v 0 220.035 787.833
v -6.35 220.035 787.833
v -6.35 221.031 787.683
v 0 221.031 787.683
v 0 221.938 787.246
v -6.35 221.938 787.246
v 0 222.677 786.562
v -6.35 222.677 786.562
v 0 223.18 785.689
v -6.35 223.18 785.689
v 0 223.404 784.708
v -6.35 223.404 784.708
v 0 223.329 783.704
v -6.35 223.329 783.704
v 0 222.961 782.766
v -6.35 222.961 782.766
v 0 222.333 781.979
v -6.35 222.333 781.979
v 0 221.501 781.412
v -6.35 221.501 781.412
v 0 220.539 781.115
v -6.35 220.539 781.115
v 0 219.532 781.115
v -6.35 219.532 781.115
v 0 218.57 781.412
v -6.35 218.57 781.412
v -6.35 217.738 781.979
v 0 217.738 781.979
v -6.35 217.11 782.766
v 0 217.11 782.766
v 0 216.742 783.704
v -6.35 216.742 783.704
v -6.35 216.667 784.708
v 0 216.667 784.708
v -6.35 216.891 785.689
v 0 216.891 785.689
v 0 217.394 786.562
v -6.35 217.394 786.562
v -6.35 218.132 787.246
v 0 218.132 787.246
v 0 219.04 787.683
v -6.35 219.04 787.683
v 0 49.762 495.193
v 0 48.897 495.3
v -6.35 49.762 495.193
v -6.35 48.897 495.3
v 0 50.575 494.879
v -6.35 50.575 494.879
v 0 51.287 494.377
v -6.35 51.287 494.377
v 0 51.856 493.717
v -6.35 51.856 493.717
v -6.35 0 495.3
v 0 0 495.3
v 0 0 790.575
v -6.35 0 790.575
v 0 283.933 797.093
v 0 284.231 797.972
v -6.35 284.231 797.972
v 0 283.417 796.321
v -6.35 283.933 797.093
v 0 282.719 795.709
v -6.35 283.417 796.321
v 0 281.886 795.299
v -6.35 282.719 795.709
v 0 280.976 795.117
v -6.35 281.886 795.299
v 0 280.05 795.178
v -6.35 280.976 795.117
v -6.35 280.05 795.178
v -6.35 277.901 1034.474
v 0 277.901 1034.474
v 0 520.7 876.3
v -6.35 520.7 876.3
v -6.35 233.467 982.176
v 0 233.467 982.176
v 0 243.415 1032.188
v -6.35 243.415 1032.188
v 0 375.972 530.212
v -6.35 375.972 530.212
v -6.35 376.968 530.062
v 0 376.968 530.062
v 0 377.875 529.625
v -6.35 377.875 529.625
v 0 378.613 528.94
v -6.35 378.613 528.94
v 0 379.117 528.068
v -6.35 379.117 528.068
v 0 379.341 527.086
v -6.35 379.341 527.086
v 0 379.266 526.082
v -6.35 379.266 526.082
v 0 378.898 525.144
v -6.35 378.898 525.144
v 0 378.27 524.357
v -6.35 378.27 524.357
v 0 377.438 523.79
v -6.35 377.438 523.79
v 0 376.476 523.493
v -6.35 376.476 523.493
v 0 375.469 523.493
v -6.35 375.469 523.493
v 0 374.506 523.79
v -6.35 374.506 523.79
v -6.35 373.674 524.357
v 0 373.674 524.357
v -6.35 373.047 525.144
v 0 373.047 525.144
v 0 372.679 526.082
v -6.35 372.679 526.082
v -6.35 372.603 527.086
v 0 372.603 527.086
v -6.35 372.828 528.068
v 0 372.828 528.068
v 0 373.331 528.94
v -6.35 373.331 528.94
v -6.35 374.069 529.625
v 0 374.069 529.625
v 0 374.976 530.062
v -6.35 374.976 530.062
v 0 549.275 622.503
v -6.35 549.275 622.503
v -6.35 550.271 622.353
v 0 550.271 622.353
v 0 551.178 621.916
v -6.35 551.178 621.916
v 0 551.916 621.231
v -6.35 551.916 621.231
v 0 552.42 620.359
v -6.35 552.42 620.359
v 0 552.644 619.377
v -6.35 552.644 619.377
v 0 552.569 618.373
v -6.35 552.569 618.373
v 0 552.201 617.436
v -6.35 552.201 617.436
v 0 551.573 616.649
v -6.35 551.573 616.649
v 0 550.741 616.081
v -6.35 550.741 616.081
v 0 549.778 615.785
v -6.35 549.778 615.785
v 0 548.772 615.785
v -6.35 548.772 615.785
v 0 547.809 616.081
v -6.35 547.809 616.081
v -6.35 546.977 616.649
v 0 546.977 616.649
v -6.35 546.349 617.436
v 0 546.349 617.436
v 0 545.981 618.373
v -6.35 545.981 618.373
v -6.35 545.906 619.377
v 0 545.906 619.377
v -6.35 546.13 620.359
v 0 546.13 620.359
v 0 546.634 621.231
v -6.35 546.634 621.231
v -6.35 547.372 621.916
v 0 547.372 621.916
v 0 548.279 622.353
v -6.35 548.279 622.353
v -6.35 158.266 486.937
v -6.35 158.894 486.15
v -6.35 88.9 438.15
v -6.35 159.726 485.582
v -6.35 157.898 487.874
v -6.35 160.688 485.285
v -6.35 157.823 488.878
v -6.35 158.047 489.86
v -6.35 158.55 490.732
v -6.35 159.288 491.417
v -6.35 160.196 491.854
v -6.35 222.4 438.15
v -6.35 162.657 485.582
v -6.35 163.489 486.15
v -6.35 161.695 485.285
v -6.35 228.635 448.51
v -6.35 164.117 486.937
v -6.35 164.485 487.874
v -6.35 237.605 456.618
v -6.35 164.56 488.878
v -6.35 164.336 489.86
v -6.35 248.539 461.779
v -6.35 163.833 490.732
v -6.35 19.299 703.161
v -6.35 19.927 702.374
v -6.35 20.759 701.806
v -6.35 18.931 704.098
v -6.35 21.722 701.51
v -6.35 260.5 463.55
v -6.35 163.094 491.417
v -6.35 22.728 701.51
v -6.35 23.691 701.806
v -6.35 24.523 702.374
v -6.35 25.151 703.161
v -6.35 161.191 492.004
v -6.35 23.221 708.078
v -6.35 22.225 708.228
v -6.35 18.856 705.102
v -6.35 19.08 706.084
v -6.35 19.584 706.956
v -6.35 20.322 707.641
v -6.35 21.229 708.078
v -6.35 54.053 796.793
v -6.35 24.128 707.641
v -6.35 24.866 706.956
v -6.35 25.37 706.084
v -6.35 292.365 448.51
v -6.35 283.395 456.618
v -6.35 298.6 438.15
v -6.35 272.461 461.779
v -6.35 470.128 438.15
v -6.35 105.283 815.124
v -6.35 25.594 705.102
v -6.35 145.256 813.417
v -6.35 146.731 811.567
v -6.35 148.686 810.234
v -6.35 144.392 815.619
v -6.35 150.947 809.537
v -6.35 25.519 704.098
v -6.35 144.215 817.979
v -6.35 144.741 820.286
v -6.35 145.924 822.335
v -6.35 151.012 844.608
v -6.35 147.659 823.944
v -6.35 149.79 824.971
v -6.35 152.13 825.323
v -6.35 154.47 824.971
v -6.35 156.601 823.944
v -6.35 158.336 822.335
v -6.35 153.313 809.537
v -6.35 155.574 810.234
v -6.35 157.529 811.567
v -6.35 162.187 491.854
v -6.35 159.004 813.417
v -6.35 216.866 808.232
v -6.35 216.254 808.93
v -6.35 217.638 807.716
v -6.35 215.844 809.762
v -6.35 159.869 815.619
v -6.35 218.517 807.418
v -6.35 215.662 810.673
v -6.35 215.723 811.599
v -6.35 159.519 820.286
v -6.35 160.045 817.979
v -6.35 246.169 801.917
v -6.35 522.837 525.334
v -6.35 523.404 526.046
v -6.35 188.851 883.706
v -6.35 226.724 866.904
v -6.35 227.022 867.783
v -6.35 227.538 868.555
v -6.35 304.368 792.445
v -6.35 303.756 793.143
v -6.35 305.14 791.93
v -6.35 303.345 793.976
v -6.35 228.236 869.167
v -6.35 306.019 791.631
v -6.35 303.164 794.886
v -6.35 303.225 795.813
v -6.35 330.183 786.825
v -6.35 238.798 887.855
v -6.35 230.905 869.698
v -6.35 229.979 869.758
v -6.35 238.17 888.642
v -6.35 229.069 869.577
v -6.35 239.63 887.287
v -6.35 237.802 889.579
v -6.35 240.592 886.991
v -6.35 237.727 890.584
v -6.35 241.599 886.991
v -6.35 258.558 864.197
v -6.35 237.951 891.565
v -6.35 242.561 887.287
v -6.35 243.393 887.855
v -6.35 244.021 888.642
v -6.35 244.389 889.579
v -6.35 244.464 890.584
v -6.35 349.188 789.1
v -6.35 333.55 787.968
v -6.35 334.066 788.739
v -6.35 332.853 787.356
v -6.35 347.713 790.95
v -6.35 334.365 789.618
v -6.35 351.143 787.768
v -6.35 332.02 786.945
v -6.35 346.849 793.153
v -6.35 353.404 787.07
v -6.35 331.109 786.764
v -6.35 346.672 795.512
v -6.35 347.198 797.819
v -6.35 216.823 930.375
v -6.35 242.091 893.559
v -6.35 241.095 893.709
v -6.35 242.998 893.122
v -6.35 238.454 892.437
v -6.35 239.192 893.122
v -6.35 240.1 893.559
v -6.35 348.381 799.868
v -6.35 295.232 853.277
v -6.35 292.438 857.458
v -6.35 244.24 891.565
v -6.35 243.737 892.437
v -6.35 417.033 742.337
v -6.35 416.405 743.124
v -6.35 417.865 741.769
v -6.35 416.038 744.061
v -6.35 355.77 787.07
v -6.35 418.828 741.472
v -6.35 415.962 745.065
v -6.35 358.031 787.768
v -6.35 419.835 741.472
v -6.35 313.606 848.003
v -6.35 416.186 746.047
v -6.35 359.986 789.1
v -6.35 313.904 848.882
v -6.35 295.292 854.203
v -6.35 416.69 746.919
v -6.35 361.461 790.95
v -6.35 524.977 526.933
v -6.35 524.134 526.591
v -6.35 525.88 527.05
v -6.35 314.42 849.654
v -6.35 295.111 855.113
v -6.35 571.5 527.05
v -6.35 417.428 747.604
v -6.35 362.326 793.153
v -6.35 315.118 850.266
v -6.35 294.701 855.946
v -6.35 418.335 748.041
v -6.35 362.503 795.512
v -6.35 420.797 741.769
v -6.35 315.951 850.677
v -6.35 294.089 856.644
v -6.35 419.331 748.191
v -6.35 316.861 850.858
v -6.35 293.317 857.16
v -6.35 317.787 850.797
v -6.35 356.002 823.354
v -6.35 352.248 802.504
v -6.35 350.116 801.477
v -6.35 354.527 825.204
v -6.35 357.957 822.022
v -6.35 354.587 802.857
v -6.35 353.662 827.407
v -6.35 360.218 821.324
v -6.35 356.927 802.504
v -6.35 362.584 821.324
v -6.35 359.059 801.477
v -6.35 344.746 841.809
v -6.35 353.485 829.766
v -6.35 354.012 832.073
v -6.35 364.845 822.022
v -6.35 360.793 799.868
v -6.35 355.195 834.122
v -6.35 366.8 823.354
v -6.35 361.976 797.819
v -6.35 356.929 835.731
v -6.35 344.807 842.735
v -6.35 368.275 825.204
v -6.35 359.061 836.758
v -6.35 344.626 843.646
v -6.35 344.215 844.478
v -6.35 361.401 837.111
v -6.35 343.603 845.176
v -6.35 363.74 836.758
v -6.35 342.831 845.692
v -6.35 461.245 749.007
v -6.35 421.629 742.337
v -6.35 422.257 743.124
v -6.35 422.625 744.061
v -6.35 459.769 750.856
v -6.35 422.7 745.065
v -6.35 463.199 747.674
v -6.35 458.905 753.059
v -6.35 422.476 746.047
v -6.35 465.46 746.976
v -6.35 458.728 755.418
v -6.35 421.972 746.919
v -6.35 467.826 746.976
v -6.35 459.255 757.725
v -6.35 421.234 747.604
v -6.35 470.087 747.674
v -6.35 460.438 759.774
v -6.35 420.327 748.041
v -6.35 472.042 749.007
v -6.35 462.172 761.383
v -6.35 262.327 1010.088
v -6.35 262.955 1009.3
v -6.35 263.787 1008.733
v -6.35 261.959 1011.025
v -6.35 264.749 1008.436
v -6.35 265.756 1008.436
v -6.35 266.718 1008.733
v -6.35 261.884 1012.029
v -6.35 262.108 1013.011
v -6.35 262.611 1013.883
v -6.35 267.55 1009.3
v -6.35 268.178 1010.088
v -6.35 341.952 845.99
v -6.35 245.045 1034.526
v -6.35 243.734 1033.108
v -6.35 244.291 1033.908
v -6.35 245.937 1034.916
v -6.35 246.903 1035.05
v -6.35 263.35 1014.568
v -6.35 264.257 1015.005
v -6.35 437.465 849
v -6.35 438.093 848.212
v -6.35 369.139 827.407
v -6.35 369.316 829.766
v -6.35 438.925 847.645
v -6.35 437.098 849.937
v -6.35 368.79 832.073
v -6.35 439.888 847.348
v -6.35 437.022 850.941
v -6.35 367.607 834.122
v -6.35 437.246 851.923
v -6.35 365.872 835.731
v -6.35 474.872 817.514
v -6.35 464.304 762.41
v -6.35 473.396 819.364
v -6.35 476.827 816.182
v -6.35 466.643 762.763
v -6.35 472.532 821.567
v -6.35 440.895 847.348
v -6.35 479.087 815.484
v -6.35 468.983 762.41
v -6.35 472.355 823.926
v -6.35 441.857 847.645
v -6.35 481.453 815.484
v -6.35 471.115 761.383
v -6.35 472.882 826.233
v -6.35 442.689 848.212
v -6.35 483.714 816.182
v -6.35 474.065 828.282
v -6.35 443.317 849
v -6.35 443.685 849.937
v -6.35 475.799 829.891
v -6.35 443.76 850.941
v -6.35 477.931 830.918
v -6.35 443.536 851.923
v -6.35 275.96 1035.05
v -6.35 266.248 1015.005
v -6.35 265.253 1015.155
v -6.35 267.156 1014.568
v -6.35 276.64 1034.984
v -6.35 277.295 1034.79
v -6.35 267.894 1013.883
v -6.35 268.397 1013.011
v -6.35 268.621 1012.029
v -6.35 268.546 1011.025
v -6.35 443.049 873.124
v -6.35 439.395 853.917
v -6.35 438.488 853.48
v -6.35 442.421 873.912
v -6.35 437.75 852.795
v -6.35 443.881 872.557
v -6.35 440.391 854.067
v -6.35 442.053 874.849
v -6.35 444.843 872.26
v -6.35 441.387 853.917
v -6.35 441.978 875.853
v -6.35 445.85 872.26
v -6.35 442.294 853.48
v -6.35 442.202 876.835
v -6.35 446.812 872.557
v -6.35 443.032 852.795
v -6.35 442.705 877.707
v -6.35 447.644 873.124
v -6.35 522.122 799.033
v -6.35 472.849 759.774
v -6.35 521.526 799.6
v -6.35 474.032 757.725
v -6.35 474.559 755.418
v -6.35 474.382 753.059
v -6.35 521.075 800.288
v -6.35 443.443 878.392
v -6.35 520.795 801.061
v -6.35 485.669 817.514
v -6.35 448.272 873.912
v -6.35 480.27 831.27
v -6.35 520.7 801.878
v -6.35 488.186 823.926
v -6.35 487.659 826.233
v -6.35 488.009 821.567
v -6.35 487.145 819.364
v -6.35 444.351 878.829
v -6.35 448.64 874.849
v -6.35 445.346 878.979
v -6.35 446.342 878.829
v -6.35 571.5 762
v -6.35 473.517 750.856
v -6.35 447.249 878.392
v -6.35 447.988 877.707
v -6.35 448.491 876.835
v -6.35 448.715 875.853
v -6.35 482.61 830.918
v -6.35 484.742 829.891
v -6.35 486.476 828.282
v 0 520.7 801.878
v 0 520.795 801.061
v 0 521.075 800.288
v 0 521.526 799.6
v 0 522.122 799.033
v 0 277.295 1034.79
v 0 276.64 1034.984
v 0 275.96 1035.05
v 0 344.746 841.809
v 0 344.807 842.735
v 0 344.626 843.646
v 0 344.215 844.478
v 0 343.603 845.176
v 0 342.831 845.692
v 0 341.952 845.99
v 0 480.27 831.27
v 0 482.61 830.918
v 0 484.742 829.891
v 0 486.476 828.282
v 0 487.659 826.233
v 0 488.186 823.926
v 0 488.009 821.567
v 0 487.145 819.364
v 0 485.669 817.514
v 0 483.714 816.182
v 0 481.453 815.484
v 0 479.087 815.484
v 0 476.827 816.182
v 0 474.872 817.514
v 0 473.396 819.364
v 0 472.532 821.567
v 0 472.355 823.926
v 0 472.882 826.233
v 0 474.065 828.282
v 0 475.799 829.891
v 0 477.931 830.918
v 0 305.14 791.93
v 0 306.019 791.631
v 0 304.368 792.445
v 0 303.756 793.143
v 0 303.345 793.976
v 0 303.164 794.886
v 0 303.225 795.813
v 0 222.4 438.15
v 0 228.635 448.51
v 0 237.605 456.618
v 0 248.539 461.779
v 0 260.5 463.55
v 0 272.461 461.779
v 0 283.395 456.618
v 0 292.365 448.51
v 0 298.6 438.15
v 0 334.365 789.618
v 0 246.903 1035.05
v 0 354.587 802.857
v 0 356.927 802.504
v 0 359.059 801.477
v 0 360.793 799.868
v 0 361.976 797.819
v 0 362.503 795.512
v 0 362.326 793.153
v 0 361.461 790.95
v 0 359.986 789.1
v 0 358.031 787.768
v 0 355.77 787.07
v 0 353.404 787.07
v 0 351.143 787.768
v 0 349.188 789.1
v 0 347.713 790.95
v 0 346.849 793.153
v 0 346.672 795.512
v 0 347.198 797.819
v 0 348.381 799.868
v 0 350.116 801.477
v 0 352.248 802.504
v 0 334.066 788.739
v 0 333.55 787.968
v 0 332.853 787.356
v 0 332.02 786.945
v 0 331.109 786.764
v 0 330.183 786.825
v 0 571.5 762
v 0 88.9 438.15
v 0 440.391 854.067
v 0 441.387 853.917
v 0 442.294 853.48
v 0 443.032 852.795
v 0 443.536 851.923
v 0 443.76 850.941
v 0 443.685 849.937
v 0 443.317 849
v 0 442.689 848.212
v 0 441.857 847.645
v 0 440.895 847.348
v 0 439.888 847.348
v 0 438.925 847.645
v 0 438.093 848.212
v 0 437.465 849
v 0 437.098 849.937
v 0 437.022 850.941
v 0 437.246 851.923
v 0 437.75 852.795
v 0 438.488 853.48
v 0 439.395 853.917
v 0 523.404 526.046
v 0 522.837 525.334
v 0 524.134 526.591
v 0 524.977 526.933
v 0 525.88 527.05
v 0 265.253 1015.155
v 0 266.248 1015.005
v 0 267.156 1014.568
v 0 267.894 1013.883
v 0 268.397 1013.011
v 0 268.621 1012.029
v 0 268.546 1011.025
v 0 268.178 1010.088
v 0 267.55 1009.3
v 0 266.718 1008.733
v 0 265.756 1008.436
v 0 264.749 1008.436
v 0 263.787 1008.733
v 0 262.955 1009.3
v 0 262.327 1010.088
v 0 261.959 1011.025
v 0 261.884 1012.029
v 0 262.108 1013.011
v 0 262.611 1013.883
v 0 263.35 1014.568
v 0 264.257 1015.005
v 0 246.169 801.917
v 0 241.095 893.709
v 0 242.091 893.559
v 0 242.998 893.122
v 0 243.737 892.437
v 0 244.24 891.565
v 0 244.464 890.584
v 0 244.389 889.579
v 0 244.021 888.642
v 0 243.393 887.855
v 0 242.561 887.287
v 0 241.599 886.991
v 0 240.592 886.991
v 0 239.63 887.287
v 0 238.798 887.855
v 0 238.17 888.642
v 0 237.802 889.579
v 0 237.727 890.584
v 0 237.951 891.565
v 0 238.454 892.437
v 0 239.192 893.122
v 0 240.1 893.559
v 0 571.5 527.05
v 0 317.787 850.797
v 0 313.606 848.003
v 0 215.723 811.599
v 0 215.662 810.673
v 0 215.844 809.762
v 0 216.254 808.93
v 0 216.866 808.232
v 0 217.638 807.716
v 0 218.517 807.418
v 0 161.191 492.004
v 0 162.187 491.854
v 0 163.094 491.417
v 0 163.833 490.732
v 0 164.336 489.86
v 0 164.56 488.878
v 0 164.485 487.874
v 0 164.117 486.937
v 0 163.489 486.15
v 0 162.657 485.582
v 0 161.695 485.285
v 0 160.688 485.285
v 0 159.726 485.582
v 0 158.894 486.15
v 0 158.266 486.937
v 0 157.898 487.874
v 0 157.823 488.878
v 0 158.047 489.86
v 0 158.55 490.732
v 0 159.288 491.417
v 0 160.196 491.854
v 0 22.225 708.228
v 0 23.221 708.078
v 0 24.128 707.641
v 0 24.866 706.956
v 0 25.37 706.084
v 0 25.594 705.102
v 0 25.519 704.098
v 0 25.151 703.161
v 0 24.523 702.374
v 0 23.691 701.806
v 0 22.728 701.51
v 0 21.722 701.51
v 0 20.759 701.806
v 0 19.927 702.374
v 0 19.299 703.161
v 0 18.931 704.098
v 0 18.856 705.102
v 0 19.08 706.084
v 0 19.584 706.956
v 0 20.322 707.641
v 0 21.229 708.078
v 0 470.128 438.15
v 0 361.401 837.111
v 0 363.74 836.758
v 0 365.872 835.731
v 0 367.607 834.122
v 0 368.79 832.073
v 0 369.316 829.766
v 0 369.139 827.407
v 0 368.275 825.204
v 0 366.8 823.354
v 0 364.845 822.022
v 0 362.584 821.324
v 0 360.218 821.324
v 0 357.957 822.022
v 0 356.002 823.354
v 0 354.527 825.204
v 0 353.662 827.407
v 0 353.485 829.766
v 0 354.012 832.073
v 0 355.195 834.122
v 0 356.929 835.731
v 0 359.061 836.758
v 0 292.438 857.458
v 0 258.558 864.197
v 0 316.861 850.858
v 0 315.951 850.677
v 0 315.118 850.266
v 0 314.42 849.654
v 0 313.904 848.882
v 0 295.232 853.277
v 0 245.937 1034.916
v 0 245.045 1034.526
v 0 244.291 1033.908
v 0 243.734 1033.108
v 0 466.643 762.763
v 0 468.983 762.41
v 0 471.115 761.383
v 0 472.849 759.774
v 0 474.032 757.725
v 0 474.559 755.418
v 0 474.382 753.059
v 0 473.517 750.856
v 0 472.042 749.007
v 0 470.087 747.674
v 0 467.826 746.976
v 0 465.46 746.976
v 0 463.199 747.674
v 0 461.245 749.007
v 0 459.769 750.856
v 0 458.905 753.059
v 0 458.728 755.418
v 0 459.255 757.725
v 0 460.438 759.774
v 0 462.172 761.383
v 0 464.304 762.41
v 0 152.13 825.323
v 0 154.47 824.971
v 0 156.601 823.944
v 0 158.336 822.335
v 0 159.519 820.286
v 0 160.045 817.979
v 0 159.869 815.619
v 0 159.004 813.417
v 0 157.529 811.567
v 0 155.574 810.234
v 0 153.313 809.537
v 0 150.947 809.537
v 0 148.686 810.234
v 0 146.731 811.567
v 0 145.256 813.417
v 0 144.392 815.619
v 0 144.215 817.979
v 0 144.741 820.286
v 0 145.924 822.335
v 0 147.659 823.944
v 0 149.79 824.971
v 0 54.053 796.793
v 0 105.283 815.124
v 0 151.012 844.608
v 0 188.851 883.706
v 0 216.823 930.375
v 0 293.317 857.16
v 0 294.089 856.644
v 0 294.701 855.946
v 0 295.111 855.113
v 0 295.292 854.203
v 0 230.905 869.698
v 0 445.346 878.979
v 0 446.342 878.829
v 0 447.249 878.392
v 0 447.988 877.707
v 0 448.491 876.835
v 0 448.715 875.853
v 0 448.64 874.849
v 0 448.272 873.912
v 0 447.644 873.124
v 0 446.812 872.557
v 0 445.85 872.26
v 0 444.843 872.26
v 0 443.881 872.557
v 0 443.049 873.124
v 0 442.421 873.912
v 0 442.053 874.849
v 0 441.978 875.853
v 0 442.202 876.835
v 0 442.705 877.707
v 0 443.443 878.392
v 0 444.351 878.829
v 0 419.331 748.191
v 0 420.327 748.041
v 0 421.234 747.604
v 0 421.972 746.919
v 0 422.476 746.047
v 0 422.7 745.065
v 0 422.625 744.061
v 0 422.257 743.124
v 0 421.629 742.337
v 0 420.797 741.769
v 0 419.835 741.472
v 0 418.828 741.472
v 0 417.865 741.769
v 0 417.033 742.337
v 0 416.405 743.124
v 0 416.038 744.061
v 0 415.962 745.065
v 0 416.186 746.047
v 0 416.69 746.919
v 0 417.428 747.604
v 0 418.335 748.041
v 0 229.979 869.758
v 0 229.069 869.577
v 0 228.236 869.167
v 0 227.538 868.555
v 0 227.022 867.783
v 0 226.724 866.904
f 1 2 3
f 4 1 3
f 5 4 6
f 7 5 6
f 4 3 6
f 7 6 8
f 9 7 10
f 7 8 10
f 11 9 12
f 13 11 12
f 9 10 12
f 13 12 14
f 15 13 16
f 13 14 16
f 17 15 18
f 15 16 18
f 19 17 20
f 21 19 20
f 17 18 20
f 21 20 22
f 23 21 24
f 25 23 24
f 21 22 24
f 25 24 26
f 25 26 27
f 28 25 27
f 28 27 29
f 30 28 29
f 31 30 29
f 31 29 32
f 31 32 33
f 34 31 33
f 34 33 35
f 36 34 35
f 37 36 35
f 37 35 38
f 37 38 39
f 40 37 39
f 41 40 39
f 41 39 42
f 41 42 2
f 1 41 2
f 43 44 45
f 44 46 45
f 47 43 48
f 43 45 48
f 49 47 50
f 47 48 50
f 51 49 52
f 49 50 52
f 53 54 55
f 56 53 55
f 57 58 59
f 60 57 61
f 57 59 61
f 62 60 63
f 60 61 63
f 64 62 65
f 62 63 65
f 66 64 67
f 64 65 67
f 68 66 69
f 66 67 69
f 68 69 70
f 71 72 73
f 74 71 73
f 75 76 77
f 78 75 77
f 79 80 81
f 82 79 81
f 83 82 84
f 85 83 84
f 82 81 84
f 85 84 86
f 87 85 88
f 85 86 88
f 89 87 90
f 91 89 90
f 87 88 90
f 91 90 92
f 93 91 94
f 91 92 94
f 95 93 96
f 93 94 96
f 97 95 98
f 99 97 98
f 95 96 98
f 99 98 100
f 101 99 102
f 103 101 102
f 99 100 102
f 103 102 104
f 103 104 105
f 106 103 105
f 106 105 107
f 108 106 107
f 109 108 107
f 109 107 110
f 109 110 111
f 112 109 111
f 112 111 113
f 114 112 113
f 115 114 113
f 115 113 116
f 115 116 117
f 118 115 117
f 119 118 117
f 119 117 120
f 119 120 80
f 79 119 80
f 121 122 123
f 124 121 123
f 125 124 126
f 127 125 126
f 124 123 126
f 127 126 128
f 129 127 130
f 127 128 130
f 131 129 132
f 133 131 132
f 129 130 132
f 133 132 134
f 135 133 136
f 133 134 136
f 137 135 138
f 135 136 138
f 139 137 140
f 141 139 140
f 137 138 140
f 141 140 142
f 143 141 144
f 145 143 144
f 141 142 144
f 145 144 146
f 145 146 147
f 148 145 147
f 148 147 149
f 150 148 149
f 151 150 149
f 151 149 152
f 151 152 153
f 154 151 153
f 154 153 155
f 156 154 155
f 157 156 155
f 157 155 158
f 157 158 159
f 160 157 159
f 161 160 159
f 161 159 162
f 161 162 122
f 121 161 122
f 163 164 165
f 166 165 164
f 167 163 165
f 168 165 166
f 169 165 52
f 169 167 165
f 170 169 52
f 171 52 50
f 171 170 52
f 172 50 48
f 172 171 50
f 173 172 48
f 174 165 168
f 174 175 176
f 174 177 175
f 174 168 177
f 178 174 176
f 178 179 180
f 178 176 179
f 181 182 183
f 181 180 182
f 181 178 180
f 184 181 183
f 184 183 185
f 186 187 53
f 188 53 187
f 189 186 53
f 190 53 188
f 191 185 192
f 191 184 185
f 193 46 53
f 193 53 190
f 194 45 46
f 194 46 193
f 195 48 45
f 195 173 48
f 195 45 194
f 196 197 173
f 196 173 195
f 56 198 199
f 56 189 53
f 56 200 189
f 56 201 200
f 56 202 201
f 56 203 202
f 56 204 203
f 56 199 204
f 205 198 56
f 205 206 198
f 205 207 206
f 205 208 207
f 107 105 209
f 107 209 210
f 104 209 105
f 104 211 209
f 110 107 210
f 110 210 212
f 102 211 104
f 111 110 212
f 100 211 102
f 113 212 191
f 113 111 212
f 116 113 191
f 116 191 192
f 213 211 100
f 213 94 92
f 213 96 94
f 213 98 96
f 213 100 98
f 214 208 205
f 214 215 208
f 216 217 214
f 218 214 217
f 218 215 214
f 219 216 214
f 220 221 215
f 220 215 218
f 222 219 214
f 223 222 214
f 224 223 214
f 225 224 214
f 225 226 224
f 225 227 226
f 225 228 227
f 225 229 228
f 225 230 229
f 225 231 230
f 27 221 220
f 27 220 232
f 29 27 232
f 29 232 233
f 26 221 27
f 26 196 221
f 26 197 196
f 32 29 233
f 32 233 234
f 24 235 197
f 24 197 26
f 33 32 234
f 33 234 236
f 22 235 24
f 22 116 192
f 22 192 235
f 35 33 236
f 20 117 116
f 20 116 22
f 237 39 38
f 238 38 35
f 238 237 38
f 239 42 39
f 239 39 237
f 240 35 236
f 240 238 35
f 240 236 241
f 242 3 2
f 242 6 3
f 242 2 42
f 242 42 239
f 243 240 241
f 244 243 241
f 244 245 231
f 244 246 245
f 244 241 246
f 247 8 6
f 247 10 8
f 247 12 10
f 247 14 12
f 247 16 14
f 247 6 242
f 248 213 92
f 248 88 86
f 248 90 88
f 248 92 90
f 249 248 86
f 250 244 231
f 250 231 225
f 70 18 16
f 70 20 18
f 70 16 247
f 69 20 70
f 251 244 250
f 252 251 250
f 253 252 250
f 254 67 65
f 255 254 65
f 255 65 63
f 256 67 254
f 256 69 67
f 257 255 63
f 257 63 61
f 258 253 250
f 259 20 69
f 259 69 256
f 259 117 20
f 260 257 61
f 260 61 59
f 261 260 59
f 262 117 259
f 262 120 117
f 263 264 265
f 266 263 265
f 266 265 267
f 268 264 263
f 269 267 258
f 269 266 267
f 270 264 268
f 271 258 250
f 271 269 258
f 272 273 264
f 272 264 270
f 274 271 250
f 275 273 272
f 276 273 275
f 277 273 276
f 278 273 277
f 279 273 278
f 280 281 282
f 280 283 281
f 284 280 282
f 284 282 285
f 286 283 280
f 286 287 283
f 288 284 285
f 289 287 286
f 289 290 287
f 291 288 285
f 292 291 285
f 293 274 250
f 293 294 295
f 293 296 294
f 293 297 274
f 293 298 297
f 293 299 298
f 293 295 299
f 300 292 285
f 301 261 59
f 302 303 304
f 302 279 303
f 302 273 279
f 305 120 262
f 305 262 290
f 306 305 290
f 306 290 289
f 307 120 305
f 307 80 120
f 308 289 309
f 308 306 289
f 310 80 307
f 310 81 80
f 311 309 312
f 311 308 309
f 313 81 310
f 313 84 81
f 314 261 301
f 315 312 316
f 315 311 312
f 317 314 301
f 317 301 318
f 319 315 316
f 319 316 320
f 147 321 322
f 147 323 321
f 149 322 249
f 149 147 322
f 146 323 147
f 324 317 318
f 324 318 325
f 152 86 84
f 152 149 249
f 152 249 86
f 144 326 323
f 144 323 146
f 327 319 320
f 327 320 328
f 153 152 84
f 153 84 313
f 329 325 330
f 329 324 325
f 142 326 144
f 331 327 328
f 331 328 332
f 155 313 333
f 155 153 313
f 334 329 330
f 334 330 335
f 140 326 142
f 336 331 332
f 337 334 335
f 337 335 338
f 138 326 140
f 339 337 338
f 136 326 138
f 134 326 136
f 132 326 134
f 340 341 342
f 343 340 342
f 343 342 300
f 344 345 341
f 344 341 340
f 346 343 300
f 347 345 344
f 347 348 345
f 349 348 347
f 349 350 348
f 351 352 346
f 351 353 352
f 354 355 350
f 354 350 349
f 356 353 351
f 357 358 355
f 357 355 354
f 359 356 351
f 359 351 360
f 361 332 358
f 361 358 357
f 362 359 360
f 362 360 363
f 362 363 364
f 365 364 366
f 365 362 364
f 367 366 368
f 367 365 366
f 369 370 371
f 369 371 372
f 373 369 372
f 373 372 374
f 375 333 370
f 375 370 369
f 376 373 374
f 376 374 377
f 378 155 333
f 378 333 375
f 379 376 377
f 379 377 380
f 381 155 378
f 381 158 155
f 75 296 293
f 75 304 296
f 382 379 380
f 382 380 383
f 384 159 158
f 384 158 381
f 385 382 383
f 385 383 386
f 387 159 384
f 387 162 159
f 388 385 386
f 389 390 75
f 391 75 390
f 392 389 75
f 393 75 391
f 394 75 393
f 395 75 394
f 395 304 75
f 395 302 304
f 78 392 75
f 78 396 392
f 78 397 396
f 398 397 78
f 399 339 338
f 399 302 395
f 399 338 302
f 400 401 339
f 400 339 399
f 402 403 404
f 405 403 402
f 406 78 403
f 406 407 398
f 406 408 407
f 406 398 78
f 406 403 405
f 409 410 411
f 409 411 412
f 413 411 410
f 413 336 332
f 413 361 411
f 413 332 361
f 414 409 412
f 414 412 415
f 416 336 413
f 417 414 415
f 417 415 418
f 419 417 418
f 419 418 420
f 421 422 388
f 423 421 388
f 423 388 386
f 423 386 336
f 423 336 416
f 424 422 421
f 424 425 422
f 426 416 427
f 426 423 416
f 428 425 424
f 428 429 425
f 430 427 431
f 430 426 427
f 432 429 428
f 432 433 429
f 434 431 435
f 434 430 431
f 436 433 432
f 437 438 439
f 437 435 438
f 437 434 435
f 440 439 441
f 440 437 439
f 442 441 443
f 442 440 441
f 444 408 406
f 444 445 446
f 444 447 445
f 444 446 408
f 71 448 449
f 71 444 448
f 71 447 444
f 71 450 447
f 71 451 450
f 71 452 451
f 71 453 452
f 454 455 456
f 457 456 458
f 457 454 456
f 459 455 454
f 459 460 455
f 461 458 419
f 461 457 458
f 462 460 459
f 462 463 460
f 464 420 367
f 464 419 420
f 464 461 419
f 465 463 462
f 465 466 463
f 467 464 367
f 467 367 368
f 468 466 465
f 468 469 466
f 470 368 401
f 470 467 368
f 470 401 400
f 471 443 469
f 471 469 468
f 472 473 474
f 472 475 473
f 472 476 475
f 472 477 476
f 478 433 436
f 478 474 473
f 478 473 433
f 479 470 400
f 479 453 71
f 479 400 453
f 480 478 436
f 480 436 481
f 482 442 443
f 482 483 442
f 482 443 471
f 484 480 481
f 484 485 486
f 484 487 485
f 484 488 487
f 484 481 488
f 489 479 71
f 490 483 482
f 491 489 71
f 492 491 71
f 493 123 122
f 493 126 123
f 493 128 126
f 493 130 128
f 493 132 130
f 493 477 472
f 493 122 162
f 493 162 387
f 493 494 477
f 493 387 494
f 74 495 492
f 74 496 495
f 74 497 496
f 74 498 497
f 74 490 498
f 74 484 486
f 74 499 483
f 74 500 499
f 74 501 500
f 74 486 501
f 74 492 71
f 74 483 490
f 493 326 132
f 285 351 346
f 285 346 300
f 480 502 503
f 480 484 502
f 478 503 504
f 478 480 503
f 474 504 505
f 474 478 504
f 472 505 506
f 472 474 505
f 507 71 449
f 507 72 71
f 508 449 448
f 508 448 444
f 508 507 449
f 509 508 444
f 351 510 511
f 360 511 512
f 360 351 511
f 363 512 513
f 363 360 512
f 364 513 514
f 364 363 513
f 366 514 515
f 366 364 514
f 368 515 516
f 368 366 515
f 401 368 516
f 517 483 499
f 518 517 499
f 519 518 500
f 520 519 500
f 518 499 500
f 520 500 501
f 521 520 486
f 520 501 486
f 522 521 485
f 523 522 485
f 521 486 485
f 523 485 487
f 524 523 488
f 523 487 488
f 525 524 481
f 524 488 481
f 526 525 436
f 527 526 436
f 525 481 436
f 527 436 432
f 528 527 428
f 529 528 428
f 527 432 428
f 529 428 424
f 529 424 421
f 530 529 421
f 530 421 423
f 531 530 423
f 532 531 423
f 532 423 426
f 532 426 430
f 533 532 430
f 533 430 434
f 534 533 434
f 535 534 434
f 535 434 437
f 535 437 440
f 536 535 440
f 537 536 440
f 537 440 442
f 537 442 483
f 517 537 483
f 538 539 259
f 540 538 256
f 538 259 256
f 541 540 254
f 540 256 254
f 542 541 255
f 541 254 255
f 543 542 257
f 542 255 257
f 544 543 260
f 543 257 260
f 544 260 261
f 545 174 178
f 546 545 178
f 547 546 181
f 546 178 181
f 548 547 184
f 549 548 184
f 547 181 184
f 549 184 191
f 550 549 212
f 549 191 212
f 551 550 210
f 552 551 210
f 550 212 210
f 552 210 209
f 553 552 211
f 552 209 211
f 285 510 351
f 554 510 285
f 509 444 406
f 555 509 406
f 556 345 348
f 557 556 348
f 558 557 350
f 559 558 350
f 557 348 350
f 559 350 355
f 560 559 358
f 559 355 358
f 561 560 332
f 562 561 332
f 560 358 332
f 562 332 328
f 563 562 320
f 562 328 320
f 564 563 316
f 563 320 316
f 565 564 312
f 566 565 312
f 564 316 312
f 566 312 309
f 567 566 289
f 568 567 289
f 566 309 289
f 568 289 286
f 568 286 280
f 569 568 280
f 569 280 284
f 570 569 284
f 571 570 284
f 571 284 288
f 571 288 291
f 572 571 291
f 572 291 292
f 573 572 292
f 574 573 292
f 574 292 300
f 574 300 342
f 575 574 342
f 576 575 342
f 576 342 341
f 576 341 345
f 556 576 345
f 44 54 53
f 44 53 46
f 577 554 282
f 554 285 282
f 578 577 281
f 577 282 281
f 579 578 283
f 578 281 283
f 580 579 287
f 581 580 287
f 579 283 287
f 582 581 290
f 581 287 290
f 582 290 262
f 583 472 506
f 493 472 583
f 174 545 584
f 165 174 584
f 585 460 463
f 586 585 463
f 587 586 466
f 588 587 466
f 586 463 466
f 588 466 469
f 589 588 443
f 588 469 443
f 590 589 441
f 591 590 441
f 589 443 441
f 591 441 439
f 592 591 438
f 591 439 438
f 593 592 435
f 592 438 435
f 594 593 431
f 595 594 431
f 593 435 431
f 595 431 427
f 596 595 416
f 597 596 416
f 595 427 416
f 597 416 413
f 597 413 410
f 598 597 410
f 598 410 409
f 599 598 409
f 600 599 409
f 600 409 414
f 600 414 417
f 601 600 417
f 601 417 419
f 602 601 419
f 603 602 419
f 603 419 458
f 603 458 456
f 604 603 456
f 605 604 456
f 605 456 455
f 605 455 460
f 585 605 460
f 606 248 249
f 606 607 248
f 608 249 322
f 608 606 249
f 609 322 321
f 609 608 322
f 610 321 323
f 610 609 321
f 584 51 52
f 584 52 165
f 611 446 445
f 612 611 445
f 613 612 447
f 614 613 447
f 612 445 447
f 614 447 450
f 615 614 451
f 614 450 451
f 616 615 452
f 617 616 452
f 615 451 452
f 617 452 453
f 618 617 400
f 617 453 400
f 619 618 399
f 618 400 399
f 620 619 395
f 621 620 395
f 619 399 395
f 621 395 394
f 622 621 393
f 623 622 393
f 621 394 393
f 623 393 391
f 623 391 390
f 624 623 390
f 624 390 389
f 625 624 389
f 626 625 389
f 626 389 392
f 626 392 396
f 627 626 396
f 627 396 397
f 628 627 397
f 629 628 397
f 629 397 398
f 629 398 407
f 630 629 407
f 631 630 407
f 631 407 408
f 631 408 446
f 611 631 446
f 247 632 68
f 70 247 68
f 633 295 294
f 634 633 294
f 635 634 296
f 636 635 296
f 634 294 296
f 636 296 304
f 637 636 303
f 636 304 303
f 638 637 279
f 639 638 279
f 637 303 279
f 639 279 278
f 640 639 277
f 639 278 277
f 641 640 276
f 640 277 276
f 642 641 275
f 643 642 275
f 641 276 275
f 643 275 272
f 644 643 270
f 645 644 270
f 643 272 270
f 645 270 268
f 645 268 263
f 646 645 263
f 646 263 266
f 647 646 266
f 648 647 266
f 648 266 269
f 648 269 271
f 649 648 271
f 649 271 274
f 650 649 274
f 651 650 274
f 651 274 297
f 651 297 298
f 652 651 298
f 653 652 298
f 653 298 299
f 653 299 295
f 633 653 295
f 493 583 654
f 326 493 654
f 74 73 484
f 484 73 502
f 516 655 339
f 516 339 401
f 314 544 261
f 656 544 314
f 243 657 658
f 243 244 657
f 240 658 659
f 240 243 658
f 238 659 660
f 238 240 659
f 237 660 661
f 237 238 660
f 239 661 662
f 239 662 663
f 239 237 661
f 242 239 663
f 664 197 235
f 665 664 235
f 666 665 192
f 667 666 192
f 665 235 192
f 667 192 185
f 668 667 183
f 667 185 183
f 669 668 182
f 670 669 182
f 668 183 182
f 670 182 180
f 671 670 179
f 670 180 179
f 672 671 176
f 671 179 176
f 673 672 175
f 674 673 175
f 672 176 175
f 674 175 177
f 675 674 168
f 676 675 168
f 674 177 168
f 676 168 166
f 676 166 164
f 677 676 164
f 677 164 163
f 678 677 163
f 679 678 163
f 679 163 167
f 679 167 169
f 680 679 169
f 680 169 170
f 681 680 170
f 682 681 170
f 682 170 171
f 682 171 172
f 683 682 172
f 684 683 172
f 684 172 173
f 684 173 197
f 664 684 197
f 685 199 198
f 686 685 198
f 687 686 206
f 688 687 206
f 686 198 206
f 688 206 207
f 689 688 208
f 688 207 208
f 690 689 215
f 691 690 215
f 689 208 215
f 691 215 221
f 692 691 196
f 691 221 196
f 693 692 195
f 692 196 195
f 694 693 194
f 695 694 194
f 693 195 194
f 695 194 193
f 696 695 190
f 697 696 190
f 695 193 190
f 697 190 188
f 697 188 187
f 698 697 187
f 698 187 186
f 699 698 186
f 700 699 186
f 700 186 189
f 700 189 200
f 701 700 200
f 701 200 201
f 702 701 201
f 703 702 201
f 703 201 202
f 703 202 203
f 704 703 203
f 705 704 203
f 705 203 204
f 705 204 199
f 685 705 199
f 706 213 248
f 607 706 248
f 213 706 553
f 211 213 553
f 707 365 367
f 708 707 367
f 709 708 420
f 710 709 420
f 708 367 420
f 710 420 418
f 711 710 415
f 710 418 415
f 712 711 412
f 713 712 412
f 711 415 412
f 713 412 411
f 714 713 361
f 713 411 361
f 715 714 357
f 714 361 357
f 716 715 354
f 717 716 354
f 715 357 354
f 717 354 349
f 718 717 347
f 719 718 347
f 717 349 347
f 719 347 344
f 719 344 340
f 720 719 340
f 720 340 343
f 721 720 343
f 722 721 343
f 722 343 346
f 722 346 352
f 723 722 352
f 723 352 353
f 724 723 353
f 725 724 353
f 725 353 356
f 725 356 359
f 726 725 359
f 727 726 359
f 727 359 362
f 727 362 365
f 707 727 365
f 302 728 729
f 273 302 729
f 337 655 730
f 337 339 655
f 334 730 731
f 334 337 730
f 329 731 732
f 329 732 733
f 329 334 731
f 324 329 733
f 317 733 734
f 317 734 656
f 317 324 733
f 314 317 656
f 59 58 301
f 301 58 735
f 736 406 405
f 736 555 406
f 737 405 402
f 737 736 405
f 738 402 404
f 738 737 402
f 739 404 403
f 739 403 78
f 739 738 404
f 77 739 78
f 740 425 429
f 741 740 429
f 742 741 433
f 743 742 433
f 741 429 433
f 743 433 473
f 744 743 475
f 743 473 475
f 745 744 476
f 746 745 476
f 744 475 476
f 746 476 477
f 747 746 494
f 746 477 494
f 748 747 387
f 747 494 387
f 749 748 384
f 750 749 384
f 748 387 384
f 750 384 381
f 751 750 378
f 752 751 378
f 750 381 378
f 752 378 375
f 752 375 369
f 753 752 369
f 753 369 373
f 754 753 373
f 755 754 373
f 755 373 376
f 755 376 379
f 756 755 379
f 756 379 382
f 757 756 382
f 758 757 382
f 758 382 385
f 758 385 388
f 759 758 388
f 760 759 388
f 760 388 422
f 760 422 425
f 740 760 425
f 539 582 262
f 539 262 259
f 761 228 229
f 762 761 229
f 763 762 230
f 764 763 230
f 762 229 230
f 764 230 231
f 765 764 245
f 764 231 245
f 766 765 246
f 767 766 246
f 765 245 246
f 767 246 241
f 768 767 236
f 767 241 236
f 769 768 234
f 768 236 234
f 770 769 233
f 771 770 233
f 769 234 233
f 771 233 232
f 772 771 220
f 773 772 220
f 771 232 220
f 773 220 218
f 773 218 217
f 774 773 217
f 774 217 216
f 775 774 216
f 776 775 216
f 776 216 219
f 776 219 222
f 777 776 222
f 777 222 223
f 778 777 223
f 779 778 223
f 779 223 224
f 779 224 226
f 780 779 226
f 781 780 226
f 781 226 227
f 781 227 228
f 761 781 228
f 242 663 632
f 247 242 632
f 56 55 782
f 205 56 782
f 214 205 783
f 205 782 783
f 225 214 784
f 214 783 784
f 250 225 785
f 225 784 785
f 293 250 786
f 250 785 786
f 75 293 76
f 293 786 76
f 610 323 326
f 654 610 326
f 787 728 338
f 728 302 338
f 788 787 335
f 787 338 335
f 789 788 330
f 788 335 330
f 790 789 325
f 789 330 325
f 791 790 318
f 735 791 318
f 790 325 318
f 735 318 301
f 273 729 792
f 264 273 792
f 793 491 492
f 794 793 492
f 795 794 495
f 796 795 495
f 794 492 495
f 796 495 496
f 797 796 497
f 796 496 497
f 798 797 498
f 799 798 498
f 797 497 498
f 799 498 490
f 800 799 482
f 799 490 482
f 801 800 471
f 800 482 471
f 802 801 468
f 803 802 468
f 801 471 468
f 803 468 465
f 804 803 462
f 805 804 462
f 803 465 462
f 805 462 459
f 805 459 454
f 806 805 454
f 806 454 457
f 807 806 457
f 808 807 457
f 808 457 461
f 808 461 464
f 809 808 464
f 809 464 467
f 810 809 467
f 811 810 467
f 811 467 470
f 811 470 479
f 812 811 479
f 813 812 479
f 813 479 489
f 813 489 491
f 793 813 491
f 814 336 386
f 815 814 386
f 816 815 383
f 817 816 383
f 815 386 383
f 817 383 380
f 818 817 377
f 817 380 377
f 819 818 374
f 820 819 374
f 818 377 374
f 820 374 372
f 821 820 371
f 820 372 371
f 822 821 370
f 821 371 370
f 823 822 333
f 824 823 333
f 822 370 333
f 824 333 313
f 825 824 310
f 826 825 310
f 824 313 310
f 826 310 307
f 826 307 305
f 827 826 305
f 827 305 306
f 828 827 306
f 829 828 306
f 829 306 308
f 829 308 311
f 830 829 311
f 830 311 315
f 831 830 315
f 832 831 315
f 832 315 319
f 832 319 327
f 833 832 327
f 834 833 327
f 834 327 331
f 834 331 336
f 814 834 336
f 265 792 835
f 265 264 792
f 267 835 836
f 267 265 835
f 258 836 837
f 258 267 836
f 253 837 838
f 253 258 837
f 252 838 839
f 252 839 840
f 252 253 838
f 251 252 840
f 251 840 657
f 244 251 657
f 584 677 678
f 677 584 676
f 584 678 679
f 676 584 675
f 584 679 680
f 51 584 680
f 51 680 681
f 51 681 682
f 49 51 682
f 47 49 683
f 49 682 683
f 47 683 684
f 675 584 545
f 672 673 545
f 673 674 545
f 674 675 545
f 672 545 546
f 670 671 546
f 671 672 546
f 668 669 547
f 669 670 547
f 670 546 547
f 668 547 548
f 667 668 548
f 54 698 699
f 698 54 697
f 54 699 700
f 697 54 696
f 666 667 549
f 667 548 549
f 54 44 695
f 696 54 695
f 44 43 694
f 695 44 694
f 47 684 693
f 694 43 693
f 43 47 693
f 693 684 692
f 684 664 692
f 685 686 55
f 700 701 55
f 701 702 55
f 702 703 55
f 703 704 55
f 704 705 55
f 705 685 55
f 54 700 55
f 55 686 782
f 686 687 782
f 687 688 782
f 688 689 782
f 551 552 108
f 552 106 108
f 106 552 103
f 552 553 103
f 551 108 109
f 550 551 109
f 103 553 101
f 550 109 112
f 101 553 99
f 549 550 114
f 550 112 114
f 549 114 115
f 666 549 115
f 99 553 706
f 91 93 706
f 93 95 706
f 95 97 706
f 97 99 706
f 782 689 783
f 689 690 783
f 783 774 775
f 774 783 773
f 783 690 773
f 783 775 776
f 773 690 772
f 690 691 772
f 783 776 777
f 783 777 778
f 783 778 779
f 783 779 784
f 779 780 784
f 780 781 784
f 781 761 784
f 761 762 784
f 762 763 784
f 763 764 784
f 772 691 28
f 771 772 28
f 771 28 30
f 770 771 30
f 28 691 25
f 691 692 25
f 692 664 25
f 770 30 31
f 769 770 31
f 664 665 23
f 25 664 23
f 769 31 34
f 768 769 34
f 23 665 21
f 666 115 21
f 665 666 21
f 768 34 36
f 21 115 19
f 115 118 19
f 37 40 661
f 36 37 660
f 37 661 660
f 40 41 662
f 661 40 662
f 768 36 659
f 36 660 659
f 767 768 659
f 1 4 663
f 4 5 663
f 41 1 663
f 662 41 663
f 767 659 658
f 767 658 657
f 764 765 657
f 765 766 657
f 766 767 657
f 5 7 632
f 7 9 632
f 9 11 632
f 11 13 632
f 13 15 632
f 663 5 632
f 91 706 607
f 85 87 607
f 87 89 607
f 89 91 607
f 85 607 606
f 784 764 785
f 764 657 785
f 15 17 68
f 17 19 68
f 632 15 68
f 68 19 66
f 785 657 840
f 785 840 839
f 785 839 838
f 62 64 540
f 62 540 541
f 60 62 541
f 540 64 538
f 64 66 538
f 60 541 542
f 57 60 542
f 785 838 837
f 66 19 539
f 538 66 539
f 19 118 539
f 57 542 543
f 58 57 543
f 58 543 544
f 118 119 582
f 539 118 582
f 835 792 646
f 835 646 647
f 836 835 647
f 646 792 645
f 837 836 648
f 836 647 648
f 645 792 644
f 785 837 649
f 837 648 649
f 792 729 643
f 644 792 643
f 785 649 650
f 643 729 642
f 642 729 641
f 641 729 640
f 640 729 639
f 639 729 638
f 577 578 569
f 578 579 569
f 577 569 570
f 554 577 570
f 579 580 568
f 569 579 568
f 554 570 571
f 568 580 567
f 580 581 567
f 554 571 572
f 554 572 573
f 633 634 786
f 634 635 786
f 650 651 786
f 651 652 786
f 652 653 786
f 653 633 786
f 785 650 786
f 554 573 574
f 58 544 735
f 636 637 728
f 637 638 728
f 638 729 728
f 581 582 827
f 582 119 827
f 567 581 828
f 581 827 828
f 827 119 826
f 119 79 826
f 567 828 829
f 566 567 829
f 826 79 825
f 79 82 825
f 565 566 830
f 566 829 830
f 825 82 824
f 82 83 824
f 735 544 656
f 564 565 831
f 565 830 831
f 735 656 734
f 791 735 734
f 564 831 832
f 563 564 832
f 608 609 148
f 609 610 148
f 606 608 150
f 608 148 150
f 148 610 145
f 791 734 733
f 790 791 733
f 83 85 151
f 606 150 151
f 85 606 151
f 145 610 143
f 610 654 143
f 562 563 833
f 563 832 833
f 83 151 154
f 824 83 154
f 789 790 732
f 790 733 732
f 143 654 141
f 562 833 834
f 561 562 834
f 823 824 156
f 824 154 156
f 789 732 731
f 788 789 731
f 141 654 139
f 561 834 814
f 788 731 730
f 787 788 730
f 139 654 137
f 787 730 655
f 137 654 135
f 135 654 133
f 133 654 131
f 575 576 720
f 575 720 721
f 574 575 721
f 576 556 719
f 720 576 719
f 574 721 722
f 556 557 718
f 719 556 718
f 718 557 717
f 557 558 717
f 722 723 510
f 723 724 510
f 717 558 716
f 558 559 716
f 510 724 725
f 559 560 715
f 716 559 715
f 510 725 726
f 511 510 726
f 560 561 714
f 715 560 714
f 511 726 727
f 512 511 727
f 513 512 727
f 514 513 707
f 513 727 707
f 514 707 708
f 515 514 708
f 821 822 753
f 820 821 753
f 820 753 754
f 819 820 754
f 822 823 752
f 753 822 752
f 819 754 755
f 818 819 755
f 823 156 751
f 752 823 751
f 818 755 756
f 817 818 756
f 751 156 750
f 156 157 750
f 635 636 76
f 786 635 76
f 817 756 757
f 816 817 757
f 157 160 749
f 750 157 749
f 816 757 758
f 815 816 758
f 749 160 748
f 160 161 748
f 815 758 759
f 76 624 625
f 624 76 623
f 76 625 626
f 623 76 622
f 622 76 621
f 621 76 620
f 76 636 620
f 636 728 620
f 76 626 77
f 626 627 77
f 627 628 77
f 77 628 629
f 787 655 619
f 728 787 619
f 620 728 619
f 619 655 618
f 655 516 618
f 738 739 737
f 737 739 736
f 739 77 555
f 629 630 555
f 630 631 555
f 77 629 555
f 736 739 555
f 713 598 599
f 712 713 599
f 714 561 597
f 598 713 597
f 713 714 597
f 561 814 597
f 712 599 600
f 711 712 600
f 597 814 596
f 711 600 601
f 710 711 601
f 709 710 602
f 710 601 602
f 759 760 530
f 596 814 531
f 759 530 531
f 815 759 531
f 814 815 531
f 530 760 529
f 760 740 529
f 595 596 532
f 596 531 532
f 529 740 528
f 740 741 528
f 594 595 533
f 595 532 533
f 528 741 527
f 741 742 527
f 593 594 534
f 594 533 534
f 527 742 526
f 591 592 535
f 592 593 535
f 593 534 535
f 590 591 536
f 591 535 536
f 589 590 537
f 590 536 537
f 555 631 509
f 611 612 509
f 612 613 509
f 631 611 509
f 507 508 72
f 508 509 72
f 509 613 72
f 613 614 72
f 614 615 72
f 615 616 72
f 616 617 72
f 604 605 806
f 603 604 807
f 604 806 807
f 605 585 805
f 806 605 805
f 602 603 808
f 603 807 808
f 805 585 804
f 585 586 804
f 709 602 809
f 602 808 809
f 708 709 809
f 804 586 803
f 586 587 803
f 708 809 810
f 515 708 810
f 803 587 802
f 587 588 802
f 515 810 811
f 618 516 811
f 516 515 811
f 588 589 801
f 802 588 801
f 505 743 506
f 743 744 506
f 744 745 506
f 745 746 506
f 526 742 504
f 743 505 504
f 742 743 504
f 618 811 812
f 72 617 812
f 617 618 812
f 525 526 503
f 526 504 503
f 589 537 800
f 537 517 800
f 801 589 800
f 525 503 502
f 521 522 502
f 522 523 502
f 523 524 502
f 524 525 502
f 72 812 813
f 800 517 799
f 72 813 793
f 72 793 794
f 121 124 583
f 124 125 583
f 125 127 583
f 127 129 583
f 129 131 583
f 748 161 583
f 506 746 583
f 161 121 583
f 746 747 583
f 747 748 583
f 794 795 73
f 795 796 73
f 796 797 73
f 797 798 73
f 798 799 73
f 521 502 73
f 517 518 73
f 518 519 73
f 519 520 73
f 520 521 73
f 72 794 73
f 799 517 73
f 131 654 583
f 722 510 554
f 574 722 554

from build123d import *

# Parameters (mm, degrees)
BASE_FLANGE1_DEPTH               = 6.35
F_1_4_CLEARANCE_HOLE1_D          = 6.7564
CUT_EXTRUDE1_DEPTH               = 1200.074385724
F_27_32_0_84375_DIAMETER_HOLE1_D = 21.43125
CUT_EXTRUDE2_DEPTH               = 1200.074385724
CUT_EXTRUDE3_DEPTH               = 1200.074385724
CUT_EXTRUDE5_DEPTH               = 1200.074385724
CUT_EXTRUDE6_DEPTH               = 1183.362497291
CUT_EXTRUDE7_DEPTH               = 1183.362497291
CUT_EXTRUDE8_DEPTH               = 1183.362497291
F_5_8_0_625_DIAMETER_HOLE1_D     = 15.875
FILLET2_R                        = 3.556


# Sheet-metal steps are written as plain solids
with BuildPart() as part:
    # Sketch1 → Base-Flange1 (new body)
    with BuildSketch(Plane(origin=(0, 0, 0), x_dir=(0, 0, -1), z_dir=(1, 0, 0))):
        with BuildLine():
            Line((-1054.1, 247.773526455), (-876.3, 520.7))
            Line((-876.3, 520.7), (-800.1, 520.7))
            Line((-800.1, 520.7), (-800.1, 571.5))
            Line((-800.1, 571.5), (-438.15, 571.5))
            Line((-438.15, 571.5), (-438.15, 125.253453767))
            Line((-438.15, 125.253453767), (-438.15, 0))
            Line((-438.15, 0), (-790.575, 0))
            ThreePointArc((-790.575, 0), (-844.607803402, 151.01156908), (-982.176450511, 233.467042956))
            Line((-982.176450511, 233.467042956), (-1054.1, 247.773526455))
        make_face()
    extrude(amount=-BASE_FLANGE1_DEPTH)

    # 1/4 Clearance Hole1 (through all)
    with Locations(Plane(origin=(0, 0, 0), x_dir=(0, 0, -1), z_dir=(1, 0, 0))):
        with Locations((-704.85, 22.225), (-1011.776786637, 265.252531308), (-488.62591807, 161.191353545), (-875.60064198, 445.346335342), (-526.833396269, 375.972216833), (-850.688695858, 440.391041163), (-744.812924838, 419.331040901), (-890.331049291, 241.095472185), (-784.455278272, 220.035471923), (-619.125, 549.275)):
            Hole(F_1_4_CLEARANCE_HOLE1_D / 2)

    # Sketch11 → Cut-Extrude1 (cut, through all)
    with BuildSketch(Plane(origin=(0, 0, 0), x_dir=(0, 0, -1), z_dir=(1, 0, 0))):
        Polygon((-845.296687768, 345.439648176), (-786.130815728, 333.670824501), (-792.324933452, 302.530891848), (-851.490805492, 314.299715524), align=None)
    extrude(amount=-CUT_EXTRUDE1_DEPTH, mode=Mode.SUBTRACT)

    # 27/32 (0.84375) Diameter Hole1 (through all)
    with Locations(Plane(origin=(0, 0, 0), x_dir=(0, 0, -1), z_dir=(1, 0, 0))):
        with Locations((-849.855910604, 239.518870383), (-822.45276987, 234.068046786)):
            Hole(F_27_32_0_84375_DIAMETER_HOLE1_D / 2)

    # Sketch14 → Cut-Extrude2 (cut, through all)
    with BuildSketch(Plane(origin=(0, 0, 0), x_dir=(0, 0, -1), z_dir=(1, 0, 0))):
        Polygon((-864.197214028, 258.557542635), (-870.391331752, 227.417609982), (-808.111466446, 215.029374534), (-801.917348722, 246.169307187), (-794.484407453, 283.53722637), (-856.764272759, 295.925461818), align=None)
    extrude(amount=-CUT_EXTRUDE2_DEPTH, mode=Mode.SUBTRACT)

    # Sketch15 → Cut-Extrude3 (cut, through all)
    with BuildSketch(Plane(origin=(0, 0, 0), x_dir=(0, 0, -1), z_dir=(1, 0, 0))):
        Polygon((-438.15, 571.5), (-476.25, 571.5), (-476.25, 523.875), (-438.15, 501.877954744), align=None)
        Polygon((-438.15, 0), (-495.3, 0), (-495.3, 50.8), (-438.15, 88.9), align=None)
    extrude(amount=-CUT_EXTRUDE3_DEPTH, mode=Mode.SUBTRACT)

    # Sketch17 → Cut-Extrude5 (cut, through all)
    with BuildSketch(Plane.ZY.offset(6.35)):
        Polygon((1035.05, 277.01564862), (1035.05, 243.984245856), (1054.1, 247.773526455), align=None)
    extrude(amount=-CUT_EXTRUDE5_DEPTH, mode=Mode.SUBTRACT)

    # Sketch18 → Cut-Extrude6 (cut, through all)
    with BuildSketch(Plane.ZY.offset(6.35)):
        Polygon((476.25, 523.875), (438.15, 501.877954744), (438.15, 470.127954744), (527.05, 523.875), (527.05, 571.5), (476.25, 571.5), align=None)
    extrude(amount=-CUT_EXTRUDE6_DEPTH, mode=Mode.SUBTRACT)

    # Sketch20 → Cut-Extrude7 (cut, through all)
    with BuildSketch(Plane.ZY.offset(6.35)):
        with BuildLine():
            Line((438.15, 298.599947238), (438.15, 222.399947238))
            ThreePointArc((438.15, 222.399947238), (463.55, 260.499947238), (438.15, 298.599947238))
        make_face()
    extrude(amount=-CUT_EXTRUDE7_DEPTH, mode=Mode.SUBTRACT)

    # Sketch22 → Cut-Extrude8 (cut, through all)
    with BuildSketch(Plane.ZY.offset(6.35)):
        Polygon((800.1, 520.7), (762, 571.5), (800.1, 571.5), align=None)
    extrude(amount=-CUT_EXTRUDE8_DEPTH, mode=Mode.SUBTRACT)

    # 5/8 (0.625) Diameter Hole1 (through all)
    with Locations(Plane(origin=(0, 0, 0), x_dir=(0, 0, -1), z_dir=(1, 0, 0))):
        with Locations((-823.332971453, 480.270476242), (-754.825119616, 466.643417249), (-817.385708629, 152.130097456), (-829.173016653, 361.400764358), (-794.919090735, 354.587234862)):
            Hole(F_5_8_0_625_DIAMETER_HOLE1_D / 2)

    # Fillet2
    fillet2_edges = [part.edges().sort_by_distance(p)[0] for p in [
        (-3.175, 314.299715524, 851.490805492),
        (-3.175, 345.439648176, 845.296687768),
        (-3.175, 333.670824501, 786.130815728),
        (-3.175, 302.530891848, 792.324933452),
        (-3.175, 295.925461818, 856.764272759),
        (-3.175, 283.53722637, 794.484407453),
        (-3.175, 215.029374534, 808.111466446),
        (-3.175, 227.417609982, 870.391331752),
        (-3.175, 520.7, 800.1),
        (-3.175, 50.8, 495.3),
        (-3.175, 277.01564862, 1035.05),
        (-3.175, 243.984245856, 1035.05),
        (-3.175, 523.875, 527.05),
    ]]
    fillet(fillet2_edges, radius=FILLET2_R)


solid = part.part
